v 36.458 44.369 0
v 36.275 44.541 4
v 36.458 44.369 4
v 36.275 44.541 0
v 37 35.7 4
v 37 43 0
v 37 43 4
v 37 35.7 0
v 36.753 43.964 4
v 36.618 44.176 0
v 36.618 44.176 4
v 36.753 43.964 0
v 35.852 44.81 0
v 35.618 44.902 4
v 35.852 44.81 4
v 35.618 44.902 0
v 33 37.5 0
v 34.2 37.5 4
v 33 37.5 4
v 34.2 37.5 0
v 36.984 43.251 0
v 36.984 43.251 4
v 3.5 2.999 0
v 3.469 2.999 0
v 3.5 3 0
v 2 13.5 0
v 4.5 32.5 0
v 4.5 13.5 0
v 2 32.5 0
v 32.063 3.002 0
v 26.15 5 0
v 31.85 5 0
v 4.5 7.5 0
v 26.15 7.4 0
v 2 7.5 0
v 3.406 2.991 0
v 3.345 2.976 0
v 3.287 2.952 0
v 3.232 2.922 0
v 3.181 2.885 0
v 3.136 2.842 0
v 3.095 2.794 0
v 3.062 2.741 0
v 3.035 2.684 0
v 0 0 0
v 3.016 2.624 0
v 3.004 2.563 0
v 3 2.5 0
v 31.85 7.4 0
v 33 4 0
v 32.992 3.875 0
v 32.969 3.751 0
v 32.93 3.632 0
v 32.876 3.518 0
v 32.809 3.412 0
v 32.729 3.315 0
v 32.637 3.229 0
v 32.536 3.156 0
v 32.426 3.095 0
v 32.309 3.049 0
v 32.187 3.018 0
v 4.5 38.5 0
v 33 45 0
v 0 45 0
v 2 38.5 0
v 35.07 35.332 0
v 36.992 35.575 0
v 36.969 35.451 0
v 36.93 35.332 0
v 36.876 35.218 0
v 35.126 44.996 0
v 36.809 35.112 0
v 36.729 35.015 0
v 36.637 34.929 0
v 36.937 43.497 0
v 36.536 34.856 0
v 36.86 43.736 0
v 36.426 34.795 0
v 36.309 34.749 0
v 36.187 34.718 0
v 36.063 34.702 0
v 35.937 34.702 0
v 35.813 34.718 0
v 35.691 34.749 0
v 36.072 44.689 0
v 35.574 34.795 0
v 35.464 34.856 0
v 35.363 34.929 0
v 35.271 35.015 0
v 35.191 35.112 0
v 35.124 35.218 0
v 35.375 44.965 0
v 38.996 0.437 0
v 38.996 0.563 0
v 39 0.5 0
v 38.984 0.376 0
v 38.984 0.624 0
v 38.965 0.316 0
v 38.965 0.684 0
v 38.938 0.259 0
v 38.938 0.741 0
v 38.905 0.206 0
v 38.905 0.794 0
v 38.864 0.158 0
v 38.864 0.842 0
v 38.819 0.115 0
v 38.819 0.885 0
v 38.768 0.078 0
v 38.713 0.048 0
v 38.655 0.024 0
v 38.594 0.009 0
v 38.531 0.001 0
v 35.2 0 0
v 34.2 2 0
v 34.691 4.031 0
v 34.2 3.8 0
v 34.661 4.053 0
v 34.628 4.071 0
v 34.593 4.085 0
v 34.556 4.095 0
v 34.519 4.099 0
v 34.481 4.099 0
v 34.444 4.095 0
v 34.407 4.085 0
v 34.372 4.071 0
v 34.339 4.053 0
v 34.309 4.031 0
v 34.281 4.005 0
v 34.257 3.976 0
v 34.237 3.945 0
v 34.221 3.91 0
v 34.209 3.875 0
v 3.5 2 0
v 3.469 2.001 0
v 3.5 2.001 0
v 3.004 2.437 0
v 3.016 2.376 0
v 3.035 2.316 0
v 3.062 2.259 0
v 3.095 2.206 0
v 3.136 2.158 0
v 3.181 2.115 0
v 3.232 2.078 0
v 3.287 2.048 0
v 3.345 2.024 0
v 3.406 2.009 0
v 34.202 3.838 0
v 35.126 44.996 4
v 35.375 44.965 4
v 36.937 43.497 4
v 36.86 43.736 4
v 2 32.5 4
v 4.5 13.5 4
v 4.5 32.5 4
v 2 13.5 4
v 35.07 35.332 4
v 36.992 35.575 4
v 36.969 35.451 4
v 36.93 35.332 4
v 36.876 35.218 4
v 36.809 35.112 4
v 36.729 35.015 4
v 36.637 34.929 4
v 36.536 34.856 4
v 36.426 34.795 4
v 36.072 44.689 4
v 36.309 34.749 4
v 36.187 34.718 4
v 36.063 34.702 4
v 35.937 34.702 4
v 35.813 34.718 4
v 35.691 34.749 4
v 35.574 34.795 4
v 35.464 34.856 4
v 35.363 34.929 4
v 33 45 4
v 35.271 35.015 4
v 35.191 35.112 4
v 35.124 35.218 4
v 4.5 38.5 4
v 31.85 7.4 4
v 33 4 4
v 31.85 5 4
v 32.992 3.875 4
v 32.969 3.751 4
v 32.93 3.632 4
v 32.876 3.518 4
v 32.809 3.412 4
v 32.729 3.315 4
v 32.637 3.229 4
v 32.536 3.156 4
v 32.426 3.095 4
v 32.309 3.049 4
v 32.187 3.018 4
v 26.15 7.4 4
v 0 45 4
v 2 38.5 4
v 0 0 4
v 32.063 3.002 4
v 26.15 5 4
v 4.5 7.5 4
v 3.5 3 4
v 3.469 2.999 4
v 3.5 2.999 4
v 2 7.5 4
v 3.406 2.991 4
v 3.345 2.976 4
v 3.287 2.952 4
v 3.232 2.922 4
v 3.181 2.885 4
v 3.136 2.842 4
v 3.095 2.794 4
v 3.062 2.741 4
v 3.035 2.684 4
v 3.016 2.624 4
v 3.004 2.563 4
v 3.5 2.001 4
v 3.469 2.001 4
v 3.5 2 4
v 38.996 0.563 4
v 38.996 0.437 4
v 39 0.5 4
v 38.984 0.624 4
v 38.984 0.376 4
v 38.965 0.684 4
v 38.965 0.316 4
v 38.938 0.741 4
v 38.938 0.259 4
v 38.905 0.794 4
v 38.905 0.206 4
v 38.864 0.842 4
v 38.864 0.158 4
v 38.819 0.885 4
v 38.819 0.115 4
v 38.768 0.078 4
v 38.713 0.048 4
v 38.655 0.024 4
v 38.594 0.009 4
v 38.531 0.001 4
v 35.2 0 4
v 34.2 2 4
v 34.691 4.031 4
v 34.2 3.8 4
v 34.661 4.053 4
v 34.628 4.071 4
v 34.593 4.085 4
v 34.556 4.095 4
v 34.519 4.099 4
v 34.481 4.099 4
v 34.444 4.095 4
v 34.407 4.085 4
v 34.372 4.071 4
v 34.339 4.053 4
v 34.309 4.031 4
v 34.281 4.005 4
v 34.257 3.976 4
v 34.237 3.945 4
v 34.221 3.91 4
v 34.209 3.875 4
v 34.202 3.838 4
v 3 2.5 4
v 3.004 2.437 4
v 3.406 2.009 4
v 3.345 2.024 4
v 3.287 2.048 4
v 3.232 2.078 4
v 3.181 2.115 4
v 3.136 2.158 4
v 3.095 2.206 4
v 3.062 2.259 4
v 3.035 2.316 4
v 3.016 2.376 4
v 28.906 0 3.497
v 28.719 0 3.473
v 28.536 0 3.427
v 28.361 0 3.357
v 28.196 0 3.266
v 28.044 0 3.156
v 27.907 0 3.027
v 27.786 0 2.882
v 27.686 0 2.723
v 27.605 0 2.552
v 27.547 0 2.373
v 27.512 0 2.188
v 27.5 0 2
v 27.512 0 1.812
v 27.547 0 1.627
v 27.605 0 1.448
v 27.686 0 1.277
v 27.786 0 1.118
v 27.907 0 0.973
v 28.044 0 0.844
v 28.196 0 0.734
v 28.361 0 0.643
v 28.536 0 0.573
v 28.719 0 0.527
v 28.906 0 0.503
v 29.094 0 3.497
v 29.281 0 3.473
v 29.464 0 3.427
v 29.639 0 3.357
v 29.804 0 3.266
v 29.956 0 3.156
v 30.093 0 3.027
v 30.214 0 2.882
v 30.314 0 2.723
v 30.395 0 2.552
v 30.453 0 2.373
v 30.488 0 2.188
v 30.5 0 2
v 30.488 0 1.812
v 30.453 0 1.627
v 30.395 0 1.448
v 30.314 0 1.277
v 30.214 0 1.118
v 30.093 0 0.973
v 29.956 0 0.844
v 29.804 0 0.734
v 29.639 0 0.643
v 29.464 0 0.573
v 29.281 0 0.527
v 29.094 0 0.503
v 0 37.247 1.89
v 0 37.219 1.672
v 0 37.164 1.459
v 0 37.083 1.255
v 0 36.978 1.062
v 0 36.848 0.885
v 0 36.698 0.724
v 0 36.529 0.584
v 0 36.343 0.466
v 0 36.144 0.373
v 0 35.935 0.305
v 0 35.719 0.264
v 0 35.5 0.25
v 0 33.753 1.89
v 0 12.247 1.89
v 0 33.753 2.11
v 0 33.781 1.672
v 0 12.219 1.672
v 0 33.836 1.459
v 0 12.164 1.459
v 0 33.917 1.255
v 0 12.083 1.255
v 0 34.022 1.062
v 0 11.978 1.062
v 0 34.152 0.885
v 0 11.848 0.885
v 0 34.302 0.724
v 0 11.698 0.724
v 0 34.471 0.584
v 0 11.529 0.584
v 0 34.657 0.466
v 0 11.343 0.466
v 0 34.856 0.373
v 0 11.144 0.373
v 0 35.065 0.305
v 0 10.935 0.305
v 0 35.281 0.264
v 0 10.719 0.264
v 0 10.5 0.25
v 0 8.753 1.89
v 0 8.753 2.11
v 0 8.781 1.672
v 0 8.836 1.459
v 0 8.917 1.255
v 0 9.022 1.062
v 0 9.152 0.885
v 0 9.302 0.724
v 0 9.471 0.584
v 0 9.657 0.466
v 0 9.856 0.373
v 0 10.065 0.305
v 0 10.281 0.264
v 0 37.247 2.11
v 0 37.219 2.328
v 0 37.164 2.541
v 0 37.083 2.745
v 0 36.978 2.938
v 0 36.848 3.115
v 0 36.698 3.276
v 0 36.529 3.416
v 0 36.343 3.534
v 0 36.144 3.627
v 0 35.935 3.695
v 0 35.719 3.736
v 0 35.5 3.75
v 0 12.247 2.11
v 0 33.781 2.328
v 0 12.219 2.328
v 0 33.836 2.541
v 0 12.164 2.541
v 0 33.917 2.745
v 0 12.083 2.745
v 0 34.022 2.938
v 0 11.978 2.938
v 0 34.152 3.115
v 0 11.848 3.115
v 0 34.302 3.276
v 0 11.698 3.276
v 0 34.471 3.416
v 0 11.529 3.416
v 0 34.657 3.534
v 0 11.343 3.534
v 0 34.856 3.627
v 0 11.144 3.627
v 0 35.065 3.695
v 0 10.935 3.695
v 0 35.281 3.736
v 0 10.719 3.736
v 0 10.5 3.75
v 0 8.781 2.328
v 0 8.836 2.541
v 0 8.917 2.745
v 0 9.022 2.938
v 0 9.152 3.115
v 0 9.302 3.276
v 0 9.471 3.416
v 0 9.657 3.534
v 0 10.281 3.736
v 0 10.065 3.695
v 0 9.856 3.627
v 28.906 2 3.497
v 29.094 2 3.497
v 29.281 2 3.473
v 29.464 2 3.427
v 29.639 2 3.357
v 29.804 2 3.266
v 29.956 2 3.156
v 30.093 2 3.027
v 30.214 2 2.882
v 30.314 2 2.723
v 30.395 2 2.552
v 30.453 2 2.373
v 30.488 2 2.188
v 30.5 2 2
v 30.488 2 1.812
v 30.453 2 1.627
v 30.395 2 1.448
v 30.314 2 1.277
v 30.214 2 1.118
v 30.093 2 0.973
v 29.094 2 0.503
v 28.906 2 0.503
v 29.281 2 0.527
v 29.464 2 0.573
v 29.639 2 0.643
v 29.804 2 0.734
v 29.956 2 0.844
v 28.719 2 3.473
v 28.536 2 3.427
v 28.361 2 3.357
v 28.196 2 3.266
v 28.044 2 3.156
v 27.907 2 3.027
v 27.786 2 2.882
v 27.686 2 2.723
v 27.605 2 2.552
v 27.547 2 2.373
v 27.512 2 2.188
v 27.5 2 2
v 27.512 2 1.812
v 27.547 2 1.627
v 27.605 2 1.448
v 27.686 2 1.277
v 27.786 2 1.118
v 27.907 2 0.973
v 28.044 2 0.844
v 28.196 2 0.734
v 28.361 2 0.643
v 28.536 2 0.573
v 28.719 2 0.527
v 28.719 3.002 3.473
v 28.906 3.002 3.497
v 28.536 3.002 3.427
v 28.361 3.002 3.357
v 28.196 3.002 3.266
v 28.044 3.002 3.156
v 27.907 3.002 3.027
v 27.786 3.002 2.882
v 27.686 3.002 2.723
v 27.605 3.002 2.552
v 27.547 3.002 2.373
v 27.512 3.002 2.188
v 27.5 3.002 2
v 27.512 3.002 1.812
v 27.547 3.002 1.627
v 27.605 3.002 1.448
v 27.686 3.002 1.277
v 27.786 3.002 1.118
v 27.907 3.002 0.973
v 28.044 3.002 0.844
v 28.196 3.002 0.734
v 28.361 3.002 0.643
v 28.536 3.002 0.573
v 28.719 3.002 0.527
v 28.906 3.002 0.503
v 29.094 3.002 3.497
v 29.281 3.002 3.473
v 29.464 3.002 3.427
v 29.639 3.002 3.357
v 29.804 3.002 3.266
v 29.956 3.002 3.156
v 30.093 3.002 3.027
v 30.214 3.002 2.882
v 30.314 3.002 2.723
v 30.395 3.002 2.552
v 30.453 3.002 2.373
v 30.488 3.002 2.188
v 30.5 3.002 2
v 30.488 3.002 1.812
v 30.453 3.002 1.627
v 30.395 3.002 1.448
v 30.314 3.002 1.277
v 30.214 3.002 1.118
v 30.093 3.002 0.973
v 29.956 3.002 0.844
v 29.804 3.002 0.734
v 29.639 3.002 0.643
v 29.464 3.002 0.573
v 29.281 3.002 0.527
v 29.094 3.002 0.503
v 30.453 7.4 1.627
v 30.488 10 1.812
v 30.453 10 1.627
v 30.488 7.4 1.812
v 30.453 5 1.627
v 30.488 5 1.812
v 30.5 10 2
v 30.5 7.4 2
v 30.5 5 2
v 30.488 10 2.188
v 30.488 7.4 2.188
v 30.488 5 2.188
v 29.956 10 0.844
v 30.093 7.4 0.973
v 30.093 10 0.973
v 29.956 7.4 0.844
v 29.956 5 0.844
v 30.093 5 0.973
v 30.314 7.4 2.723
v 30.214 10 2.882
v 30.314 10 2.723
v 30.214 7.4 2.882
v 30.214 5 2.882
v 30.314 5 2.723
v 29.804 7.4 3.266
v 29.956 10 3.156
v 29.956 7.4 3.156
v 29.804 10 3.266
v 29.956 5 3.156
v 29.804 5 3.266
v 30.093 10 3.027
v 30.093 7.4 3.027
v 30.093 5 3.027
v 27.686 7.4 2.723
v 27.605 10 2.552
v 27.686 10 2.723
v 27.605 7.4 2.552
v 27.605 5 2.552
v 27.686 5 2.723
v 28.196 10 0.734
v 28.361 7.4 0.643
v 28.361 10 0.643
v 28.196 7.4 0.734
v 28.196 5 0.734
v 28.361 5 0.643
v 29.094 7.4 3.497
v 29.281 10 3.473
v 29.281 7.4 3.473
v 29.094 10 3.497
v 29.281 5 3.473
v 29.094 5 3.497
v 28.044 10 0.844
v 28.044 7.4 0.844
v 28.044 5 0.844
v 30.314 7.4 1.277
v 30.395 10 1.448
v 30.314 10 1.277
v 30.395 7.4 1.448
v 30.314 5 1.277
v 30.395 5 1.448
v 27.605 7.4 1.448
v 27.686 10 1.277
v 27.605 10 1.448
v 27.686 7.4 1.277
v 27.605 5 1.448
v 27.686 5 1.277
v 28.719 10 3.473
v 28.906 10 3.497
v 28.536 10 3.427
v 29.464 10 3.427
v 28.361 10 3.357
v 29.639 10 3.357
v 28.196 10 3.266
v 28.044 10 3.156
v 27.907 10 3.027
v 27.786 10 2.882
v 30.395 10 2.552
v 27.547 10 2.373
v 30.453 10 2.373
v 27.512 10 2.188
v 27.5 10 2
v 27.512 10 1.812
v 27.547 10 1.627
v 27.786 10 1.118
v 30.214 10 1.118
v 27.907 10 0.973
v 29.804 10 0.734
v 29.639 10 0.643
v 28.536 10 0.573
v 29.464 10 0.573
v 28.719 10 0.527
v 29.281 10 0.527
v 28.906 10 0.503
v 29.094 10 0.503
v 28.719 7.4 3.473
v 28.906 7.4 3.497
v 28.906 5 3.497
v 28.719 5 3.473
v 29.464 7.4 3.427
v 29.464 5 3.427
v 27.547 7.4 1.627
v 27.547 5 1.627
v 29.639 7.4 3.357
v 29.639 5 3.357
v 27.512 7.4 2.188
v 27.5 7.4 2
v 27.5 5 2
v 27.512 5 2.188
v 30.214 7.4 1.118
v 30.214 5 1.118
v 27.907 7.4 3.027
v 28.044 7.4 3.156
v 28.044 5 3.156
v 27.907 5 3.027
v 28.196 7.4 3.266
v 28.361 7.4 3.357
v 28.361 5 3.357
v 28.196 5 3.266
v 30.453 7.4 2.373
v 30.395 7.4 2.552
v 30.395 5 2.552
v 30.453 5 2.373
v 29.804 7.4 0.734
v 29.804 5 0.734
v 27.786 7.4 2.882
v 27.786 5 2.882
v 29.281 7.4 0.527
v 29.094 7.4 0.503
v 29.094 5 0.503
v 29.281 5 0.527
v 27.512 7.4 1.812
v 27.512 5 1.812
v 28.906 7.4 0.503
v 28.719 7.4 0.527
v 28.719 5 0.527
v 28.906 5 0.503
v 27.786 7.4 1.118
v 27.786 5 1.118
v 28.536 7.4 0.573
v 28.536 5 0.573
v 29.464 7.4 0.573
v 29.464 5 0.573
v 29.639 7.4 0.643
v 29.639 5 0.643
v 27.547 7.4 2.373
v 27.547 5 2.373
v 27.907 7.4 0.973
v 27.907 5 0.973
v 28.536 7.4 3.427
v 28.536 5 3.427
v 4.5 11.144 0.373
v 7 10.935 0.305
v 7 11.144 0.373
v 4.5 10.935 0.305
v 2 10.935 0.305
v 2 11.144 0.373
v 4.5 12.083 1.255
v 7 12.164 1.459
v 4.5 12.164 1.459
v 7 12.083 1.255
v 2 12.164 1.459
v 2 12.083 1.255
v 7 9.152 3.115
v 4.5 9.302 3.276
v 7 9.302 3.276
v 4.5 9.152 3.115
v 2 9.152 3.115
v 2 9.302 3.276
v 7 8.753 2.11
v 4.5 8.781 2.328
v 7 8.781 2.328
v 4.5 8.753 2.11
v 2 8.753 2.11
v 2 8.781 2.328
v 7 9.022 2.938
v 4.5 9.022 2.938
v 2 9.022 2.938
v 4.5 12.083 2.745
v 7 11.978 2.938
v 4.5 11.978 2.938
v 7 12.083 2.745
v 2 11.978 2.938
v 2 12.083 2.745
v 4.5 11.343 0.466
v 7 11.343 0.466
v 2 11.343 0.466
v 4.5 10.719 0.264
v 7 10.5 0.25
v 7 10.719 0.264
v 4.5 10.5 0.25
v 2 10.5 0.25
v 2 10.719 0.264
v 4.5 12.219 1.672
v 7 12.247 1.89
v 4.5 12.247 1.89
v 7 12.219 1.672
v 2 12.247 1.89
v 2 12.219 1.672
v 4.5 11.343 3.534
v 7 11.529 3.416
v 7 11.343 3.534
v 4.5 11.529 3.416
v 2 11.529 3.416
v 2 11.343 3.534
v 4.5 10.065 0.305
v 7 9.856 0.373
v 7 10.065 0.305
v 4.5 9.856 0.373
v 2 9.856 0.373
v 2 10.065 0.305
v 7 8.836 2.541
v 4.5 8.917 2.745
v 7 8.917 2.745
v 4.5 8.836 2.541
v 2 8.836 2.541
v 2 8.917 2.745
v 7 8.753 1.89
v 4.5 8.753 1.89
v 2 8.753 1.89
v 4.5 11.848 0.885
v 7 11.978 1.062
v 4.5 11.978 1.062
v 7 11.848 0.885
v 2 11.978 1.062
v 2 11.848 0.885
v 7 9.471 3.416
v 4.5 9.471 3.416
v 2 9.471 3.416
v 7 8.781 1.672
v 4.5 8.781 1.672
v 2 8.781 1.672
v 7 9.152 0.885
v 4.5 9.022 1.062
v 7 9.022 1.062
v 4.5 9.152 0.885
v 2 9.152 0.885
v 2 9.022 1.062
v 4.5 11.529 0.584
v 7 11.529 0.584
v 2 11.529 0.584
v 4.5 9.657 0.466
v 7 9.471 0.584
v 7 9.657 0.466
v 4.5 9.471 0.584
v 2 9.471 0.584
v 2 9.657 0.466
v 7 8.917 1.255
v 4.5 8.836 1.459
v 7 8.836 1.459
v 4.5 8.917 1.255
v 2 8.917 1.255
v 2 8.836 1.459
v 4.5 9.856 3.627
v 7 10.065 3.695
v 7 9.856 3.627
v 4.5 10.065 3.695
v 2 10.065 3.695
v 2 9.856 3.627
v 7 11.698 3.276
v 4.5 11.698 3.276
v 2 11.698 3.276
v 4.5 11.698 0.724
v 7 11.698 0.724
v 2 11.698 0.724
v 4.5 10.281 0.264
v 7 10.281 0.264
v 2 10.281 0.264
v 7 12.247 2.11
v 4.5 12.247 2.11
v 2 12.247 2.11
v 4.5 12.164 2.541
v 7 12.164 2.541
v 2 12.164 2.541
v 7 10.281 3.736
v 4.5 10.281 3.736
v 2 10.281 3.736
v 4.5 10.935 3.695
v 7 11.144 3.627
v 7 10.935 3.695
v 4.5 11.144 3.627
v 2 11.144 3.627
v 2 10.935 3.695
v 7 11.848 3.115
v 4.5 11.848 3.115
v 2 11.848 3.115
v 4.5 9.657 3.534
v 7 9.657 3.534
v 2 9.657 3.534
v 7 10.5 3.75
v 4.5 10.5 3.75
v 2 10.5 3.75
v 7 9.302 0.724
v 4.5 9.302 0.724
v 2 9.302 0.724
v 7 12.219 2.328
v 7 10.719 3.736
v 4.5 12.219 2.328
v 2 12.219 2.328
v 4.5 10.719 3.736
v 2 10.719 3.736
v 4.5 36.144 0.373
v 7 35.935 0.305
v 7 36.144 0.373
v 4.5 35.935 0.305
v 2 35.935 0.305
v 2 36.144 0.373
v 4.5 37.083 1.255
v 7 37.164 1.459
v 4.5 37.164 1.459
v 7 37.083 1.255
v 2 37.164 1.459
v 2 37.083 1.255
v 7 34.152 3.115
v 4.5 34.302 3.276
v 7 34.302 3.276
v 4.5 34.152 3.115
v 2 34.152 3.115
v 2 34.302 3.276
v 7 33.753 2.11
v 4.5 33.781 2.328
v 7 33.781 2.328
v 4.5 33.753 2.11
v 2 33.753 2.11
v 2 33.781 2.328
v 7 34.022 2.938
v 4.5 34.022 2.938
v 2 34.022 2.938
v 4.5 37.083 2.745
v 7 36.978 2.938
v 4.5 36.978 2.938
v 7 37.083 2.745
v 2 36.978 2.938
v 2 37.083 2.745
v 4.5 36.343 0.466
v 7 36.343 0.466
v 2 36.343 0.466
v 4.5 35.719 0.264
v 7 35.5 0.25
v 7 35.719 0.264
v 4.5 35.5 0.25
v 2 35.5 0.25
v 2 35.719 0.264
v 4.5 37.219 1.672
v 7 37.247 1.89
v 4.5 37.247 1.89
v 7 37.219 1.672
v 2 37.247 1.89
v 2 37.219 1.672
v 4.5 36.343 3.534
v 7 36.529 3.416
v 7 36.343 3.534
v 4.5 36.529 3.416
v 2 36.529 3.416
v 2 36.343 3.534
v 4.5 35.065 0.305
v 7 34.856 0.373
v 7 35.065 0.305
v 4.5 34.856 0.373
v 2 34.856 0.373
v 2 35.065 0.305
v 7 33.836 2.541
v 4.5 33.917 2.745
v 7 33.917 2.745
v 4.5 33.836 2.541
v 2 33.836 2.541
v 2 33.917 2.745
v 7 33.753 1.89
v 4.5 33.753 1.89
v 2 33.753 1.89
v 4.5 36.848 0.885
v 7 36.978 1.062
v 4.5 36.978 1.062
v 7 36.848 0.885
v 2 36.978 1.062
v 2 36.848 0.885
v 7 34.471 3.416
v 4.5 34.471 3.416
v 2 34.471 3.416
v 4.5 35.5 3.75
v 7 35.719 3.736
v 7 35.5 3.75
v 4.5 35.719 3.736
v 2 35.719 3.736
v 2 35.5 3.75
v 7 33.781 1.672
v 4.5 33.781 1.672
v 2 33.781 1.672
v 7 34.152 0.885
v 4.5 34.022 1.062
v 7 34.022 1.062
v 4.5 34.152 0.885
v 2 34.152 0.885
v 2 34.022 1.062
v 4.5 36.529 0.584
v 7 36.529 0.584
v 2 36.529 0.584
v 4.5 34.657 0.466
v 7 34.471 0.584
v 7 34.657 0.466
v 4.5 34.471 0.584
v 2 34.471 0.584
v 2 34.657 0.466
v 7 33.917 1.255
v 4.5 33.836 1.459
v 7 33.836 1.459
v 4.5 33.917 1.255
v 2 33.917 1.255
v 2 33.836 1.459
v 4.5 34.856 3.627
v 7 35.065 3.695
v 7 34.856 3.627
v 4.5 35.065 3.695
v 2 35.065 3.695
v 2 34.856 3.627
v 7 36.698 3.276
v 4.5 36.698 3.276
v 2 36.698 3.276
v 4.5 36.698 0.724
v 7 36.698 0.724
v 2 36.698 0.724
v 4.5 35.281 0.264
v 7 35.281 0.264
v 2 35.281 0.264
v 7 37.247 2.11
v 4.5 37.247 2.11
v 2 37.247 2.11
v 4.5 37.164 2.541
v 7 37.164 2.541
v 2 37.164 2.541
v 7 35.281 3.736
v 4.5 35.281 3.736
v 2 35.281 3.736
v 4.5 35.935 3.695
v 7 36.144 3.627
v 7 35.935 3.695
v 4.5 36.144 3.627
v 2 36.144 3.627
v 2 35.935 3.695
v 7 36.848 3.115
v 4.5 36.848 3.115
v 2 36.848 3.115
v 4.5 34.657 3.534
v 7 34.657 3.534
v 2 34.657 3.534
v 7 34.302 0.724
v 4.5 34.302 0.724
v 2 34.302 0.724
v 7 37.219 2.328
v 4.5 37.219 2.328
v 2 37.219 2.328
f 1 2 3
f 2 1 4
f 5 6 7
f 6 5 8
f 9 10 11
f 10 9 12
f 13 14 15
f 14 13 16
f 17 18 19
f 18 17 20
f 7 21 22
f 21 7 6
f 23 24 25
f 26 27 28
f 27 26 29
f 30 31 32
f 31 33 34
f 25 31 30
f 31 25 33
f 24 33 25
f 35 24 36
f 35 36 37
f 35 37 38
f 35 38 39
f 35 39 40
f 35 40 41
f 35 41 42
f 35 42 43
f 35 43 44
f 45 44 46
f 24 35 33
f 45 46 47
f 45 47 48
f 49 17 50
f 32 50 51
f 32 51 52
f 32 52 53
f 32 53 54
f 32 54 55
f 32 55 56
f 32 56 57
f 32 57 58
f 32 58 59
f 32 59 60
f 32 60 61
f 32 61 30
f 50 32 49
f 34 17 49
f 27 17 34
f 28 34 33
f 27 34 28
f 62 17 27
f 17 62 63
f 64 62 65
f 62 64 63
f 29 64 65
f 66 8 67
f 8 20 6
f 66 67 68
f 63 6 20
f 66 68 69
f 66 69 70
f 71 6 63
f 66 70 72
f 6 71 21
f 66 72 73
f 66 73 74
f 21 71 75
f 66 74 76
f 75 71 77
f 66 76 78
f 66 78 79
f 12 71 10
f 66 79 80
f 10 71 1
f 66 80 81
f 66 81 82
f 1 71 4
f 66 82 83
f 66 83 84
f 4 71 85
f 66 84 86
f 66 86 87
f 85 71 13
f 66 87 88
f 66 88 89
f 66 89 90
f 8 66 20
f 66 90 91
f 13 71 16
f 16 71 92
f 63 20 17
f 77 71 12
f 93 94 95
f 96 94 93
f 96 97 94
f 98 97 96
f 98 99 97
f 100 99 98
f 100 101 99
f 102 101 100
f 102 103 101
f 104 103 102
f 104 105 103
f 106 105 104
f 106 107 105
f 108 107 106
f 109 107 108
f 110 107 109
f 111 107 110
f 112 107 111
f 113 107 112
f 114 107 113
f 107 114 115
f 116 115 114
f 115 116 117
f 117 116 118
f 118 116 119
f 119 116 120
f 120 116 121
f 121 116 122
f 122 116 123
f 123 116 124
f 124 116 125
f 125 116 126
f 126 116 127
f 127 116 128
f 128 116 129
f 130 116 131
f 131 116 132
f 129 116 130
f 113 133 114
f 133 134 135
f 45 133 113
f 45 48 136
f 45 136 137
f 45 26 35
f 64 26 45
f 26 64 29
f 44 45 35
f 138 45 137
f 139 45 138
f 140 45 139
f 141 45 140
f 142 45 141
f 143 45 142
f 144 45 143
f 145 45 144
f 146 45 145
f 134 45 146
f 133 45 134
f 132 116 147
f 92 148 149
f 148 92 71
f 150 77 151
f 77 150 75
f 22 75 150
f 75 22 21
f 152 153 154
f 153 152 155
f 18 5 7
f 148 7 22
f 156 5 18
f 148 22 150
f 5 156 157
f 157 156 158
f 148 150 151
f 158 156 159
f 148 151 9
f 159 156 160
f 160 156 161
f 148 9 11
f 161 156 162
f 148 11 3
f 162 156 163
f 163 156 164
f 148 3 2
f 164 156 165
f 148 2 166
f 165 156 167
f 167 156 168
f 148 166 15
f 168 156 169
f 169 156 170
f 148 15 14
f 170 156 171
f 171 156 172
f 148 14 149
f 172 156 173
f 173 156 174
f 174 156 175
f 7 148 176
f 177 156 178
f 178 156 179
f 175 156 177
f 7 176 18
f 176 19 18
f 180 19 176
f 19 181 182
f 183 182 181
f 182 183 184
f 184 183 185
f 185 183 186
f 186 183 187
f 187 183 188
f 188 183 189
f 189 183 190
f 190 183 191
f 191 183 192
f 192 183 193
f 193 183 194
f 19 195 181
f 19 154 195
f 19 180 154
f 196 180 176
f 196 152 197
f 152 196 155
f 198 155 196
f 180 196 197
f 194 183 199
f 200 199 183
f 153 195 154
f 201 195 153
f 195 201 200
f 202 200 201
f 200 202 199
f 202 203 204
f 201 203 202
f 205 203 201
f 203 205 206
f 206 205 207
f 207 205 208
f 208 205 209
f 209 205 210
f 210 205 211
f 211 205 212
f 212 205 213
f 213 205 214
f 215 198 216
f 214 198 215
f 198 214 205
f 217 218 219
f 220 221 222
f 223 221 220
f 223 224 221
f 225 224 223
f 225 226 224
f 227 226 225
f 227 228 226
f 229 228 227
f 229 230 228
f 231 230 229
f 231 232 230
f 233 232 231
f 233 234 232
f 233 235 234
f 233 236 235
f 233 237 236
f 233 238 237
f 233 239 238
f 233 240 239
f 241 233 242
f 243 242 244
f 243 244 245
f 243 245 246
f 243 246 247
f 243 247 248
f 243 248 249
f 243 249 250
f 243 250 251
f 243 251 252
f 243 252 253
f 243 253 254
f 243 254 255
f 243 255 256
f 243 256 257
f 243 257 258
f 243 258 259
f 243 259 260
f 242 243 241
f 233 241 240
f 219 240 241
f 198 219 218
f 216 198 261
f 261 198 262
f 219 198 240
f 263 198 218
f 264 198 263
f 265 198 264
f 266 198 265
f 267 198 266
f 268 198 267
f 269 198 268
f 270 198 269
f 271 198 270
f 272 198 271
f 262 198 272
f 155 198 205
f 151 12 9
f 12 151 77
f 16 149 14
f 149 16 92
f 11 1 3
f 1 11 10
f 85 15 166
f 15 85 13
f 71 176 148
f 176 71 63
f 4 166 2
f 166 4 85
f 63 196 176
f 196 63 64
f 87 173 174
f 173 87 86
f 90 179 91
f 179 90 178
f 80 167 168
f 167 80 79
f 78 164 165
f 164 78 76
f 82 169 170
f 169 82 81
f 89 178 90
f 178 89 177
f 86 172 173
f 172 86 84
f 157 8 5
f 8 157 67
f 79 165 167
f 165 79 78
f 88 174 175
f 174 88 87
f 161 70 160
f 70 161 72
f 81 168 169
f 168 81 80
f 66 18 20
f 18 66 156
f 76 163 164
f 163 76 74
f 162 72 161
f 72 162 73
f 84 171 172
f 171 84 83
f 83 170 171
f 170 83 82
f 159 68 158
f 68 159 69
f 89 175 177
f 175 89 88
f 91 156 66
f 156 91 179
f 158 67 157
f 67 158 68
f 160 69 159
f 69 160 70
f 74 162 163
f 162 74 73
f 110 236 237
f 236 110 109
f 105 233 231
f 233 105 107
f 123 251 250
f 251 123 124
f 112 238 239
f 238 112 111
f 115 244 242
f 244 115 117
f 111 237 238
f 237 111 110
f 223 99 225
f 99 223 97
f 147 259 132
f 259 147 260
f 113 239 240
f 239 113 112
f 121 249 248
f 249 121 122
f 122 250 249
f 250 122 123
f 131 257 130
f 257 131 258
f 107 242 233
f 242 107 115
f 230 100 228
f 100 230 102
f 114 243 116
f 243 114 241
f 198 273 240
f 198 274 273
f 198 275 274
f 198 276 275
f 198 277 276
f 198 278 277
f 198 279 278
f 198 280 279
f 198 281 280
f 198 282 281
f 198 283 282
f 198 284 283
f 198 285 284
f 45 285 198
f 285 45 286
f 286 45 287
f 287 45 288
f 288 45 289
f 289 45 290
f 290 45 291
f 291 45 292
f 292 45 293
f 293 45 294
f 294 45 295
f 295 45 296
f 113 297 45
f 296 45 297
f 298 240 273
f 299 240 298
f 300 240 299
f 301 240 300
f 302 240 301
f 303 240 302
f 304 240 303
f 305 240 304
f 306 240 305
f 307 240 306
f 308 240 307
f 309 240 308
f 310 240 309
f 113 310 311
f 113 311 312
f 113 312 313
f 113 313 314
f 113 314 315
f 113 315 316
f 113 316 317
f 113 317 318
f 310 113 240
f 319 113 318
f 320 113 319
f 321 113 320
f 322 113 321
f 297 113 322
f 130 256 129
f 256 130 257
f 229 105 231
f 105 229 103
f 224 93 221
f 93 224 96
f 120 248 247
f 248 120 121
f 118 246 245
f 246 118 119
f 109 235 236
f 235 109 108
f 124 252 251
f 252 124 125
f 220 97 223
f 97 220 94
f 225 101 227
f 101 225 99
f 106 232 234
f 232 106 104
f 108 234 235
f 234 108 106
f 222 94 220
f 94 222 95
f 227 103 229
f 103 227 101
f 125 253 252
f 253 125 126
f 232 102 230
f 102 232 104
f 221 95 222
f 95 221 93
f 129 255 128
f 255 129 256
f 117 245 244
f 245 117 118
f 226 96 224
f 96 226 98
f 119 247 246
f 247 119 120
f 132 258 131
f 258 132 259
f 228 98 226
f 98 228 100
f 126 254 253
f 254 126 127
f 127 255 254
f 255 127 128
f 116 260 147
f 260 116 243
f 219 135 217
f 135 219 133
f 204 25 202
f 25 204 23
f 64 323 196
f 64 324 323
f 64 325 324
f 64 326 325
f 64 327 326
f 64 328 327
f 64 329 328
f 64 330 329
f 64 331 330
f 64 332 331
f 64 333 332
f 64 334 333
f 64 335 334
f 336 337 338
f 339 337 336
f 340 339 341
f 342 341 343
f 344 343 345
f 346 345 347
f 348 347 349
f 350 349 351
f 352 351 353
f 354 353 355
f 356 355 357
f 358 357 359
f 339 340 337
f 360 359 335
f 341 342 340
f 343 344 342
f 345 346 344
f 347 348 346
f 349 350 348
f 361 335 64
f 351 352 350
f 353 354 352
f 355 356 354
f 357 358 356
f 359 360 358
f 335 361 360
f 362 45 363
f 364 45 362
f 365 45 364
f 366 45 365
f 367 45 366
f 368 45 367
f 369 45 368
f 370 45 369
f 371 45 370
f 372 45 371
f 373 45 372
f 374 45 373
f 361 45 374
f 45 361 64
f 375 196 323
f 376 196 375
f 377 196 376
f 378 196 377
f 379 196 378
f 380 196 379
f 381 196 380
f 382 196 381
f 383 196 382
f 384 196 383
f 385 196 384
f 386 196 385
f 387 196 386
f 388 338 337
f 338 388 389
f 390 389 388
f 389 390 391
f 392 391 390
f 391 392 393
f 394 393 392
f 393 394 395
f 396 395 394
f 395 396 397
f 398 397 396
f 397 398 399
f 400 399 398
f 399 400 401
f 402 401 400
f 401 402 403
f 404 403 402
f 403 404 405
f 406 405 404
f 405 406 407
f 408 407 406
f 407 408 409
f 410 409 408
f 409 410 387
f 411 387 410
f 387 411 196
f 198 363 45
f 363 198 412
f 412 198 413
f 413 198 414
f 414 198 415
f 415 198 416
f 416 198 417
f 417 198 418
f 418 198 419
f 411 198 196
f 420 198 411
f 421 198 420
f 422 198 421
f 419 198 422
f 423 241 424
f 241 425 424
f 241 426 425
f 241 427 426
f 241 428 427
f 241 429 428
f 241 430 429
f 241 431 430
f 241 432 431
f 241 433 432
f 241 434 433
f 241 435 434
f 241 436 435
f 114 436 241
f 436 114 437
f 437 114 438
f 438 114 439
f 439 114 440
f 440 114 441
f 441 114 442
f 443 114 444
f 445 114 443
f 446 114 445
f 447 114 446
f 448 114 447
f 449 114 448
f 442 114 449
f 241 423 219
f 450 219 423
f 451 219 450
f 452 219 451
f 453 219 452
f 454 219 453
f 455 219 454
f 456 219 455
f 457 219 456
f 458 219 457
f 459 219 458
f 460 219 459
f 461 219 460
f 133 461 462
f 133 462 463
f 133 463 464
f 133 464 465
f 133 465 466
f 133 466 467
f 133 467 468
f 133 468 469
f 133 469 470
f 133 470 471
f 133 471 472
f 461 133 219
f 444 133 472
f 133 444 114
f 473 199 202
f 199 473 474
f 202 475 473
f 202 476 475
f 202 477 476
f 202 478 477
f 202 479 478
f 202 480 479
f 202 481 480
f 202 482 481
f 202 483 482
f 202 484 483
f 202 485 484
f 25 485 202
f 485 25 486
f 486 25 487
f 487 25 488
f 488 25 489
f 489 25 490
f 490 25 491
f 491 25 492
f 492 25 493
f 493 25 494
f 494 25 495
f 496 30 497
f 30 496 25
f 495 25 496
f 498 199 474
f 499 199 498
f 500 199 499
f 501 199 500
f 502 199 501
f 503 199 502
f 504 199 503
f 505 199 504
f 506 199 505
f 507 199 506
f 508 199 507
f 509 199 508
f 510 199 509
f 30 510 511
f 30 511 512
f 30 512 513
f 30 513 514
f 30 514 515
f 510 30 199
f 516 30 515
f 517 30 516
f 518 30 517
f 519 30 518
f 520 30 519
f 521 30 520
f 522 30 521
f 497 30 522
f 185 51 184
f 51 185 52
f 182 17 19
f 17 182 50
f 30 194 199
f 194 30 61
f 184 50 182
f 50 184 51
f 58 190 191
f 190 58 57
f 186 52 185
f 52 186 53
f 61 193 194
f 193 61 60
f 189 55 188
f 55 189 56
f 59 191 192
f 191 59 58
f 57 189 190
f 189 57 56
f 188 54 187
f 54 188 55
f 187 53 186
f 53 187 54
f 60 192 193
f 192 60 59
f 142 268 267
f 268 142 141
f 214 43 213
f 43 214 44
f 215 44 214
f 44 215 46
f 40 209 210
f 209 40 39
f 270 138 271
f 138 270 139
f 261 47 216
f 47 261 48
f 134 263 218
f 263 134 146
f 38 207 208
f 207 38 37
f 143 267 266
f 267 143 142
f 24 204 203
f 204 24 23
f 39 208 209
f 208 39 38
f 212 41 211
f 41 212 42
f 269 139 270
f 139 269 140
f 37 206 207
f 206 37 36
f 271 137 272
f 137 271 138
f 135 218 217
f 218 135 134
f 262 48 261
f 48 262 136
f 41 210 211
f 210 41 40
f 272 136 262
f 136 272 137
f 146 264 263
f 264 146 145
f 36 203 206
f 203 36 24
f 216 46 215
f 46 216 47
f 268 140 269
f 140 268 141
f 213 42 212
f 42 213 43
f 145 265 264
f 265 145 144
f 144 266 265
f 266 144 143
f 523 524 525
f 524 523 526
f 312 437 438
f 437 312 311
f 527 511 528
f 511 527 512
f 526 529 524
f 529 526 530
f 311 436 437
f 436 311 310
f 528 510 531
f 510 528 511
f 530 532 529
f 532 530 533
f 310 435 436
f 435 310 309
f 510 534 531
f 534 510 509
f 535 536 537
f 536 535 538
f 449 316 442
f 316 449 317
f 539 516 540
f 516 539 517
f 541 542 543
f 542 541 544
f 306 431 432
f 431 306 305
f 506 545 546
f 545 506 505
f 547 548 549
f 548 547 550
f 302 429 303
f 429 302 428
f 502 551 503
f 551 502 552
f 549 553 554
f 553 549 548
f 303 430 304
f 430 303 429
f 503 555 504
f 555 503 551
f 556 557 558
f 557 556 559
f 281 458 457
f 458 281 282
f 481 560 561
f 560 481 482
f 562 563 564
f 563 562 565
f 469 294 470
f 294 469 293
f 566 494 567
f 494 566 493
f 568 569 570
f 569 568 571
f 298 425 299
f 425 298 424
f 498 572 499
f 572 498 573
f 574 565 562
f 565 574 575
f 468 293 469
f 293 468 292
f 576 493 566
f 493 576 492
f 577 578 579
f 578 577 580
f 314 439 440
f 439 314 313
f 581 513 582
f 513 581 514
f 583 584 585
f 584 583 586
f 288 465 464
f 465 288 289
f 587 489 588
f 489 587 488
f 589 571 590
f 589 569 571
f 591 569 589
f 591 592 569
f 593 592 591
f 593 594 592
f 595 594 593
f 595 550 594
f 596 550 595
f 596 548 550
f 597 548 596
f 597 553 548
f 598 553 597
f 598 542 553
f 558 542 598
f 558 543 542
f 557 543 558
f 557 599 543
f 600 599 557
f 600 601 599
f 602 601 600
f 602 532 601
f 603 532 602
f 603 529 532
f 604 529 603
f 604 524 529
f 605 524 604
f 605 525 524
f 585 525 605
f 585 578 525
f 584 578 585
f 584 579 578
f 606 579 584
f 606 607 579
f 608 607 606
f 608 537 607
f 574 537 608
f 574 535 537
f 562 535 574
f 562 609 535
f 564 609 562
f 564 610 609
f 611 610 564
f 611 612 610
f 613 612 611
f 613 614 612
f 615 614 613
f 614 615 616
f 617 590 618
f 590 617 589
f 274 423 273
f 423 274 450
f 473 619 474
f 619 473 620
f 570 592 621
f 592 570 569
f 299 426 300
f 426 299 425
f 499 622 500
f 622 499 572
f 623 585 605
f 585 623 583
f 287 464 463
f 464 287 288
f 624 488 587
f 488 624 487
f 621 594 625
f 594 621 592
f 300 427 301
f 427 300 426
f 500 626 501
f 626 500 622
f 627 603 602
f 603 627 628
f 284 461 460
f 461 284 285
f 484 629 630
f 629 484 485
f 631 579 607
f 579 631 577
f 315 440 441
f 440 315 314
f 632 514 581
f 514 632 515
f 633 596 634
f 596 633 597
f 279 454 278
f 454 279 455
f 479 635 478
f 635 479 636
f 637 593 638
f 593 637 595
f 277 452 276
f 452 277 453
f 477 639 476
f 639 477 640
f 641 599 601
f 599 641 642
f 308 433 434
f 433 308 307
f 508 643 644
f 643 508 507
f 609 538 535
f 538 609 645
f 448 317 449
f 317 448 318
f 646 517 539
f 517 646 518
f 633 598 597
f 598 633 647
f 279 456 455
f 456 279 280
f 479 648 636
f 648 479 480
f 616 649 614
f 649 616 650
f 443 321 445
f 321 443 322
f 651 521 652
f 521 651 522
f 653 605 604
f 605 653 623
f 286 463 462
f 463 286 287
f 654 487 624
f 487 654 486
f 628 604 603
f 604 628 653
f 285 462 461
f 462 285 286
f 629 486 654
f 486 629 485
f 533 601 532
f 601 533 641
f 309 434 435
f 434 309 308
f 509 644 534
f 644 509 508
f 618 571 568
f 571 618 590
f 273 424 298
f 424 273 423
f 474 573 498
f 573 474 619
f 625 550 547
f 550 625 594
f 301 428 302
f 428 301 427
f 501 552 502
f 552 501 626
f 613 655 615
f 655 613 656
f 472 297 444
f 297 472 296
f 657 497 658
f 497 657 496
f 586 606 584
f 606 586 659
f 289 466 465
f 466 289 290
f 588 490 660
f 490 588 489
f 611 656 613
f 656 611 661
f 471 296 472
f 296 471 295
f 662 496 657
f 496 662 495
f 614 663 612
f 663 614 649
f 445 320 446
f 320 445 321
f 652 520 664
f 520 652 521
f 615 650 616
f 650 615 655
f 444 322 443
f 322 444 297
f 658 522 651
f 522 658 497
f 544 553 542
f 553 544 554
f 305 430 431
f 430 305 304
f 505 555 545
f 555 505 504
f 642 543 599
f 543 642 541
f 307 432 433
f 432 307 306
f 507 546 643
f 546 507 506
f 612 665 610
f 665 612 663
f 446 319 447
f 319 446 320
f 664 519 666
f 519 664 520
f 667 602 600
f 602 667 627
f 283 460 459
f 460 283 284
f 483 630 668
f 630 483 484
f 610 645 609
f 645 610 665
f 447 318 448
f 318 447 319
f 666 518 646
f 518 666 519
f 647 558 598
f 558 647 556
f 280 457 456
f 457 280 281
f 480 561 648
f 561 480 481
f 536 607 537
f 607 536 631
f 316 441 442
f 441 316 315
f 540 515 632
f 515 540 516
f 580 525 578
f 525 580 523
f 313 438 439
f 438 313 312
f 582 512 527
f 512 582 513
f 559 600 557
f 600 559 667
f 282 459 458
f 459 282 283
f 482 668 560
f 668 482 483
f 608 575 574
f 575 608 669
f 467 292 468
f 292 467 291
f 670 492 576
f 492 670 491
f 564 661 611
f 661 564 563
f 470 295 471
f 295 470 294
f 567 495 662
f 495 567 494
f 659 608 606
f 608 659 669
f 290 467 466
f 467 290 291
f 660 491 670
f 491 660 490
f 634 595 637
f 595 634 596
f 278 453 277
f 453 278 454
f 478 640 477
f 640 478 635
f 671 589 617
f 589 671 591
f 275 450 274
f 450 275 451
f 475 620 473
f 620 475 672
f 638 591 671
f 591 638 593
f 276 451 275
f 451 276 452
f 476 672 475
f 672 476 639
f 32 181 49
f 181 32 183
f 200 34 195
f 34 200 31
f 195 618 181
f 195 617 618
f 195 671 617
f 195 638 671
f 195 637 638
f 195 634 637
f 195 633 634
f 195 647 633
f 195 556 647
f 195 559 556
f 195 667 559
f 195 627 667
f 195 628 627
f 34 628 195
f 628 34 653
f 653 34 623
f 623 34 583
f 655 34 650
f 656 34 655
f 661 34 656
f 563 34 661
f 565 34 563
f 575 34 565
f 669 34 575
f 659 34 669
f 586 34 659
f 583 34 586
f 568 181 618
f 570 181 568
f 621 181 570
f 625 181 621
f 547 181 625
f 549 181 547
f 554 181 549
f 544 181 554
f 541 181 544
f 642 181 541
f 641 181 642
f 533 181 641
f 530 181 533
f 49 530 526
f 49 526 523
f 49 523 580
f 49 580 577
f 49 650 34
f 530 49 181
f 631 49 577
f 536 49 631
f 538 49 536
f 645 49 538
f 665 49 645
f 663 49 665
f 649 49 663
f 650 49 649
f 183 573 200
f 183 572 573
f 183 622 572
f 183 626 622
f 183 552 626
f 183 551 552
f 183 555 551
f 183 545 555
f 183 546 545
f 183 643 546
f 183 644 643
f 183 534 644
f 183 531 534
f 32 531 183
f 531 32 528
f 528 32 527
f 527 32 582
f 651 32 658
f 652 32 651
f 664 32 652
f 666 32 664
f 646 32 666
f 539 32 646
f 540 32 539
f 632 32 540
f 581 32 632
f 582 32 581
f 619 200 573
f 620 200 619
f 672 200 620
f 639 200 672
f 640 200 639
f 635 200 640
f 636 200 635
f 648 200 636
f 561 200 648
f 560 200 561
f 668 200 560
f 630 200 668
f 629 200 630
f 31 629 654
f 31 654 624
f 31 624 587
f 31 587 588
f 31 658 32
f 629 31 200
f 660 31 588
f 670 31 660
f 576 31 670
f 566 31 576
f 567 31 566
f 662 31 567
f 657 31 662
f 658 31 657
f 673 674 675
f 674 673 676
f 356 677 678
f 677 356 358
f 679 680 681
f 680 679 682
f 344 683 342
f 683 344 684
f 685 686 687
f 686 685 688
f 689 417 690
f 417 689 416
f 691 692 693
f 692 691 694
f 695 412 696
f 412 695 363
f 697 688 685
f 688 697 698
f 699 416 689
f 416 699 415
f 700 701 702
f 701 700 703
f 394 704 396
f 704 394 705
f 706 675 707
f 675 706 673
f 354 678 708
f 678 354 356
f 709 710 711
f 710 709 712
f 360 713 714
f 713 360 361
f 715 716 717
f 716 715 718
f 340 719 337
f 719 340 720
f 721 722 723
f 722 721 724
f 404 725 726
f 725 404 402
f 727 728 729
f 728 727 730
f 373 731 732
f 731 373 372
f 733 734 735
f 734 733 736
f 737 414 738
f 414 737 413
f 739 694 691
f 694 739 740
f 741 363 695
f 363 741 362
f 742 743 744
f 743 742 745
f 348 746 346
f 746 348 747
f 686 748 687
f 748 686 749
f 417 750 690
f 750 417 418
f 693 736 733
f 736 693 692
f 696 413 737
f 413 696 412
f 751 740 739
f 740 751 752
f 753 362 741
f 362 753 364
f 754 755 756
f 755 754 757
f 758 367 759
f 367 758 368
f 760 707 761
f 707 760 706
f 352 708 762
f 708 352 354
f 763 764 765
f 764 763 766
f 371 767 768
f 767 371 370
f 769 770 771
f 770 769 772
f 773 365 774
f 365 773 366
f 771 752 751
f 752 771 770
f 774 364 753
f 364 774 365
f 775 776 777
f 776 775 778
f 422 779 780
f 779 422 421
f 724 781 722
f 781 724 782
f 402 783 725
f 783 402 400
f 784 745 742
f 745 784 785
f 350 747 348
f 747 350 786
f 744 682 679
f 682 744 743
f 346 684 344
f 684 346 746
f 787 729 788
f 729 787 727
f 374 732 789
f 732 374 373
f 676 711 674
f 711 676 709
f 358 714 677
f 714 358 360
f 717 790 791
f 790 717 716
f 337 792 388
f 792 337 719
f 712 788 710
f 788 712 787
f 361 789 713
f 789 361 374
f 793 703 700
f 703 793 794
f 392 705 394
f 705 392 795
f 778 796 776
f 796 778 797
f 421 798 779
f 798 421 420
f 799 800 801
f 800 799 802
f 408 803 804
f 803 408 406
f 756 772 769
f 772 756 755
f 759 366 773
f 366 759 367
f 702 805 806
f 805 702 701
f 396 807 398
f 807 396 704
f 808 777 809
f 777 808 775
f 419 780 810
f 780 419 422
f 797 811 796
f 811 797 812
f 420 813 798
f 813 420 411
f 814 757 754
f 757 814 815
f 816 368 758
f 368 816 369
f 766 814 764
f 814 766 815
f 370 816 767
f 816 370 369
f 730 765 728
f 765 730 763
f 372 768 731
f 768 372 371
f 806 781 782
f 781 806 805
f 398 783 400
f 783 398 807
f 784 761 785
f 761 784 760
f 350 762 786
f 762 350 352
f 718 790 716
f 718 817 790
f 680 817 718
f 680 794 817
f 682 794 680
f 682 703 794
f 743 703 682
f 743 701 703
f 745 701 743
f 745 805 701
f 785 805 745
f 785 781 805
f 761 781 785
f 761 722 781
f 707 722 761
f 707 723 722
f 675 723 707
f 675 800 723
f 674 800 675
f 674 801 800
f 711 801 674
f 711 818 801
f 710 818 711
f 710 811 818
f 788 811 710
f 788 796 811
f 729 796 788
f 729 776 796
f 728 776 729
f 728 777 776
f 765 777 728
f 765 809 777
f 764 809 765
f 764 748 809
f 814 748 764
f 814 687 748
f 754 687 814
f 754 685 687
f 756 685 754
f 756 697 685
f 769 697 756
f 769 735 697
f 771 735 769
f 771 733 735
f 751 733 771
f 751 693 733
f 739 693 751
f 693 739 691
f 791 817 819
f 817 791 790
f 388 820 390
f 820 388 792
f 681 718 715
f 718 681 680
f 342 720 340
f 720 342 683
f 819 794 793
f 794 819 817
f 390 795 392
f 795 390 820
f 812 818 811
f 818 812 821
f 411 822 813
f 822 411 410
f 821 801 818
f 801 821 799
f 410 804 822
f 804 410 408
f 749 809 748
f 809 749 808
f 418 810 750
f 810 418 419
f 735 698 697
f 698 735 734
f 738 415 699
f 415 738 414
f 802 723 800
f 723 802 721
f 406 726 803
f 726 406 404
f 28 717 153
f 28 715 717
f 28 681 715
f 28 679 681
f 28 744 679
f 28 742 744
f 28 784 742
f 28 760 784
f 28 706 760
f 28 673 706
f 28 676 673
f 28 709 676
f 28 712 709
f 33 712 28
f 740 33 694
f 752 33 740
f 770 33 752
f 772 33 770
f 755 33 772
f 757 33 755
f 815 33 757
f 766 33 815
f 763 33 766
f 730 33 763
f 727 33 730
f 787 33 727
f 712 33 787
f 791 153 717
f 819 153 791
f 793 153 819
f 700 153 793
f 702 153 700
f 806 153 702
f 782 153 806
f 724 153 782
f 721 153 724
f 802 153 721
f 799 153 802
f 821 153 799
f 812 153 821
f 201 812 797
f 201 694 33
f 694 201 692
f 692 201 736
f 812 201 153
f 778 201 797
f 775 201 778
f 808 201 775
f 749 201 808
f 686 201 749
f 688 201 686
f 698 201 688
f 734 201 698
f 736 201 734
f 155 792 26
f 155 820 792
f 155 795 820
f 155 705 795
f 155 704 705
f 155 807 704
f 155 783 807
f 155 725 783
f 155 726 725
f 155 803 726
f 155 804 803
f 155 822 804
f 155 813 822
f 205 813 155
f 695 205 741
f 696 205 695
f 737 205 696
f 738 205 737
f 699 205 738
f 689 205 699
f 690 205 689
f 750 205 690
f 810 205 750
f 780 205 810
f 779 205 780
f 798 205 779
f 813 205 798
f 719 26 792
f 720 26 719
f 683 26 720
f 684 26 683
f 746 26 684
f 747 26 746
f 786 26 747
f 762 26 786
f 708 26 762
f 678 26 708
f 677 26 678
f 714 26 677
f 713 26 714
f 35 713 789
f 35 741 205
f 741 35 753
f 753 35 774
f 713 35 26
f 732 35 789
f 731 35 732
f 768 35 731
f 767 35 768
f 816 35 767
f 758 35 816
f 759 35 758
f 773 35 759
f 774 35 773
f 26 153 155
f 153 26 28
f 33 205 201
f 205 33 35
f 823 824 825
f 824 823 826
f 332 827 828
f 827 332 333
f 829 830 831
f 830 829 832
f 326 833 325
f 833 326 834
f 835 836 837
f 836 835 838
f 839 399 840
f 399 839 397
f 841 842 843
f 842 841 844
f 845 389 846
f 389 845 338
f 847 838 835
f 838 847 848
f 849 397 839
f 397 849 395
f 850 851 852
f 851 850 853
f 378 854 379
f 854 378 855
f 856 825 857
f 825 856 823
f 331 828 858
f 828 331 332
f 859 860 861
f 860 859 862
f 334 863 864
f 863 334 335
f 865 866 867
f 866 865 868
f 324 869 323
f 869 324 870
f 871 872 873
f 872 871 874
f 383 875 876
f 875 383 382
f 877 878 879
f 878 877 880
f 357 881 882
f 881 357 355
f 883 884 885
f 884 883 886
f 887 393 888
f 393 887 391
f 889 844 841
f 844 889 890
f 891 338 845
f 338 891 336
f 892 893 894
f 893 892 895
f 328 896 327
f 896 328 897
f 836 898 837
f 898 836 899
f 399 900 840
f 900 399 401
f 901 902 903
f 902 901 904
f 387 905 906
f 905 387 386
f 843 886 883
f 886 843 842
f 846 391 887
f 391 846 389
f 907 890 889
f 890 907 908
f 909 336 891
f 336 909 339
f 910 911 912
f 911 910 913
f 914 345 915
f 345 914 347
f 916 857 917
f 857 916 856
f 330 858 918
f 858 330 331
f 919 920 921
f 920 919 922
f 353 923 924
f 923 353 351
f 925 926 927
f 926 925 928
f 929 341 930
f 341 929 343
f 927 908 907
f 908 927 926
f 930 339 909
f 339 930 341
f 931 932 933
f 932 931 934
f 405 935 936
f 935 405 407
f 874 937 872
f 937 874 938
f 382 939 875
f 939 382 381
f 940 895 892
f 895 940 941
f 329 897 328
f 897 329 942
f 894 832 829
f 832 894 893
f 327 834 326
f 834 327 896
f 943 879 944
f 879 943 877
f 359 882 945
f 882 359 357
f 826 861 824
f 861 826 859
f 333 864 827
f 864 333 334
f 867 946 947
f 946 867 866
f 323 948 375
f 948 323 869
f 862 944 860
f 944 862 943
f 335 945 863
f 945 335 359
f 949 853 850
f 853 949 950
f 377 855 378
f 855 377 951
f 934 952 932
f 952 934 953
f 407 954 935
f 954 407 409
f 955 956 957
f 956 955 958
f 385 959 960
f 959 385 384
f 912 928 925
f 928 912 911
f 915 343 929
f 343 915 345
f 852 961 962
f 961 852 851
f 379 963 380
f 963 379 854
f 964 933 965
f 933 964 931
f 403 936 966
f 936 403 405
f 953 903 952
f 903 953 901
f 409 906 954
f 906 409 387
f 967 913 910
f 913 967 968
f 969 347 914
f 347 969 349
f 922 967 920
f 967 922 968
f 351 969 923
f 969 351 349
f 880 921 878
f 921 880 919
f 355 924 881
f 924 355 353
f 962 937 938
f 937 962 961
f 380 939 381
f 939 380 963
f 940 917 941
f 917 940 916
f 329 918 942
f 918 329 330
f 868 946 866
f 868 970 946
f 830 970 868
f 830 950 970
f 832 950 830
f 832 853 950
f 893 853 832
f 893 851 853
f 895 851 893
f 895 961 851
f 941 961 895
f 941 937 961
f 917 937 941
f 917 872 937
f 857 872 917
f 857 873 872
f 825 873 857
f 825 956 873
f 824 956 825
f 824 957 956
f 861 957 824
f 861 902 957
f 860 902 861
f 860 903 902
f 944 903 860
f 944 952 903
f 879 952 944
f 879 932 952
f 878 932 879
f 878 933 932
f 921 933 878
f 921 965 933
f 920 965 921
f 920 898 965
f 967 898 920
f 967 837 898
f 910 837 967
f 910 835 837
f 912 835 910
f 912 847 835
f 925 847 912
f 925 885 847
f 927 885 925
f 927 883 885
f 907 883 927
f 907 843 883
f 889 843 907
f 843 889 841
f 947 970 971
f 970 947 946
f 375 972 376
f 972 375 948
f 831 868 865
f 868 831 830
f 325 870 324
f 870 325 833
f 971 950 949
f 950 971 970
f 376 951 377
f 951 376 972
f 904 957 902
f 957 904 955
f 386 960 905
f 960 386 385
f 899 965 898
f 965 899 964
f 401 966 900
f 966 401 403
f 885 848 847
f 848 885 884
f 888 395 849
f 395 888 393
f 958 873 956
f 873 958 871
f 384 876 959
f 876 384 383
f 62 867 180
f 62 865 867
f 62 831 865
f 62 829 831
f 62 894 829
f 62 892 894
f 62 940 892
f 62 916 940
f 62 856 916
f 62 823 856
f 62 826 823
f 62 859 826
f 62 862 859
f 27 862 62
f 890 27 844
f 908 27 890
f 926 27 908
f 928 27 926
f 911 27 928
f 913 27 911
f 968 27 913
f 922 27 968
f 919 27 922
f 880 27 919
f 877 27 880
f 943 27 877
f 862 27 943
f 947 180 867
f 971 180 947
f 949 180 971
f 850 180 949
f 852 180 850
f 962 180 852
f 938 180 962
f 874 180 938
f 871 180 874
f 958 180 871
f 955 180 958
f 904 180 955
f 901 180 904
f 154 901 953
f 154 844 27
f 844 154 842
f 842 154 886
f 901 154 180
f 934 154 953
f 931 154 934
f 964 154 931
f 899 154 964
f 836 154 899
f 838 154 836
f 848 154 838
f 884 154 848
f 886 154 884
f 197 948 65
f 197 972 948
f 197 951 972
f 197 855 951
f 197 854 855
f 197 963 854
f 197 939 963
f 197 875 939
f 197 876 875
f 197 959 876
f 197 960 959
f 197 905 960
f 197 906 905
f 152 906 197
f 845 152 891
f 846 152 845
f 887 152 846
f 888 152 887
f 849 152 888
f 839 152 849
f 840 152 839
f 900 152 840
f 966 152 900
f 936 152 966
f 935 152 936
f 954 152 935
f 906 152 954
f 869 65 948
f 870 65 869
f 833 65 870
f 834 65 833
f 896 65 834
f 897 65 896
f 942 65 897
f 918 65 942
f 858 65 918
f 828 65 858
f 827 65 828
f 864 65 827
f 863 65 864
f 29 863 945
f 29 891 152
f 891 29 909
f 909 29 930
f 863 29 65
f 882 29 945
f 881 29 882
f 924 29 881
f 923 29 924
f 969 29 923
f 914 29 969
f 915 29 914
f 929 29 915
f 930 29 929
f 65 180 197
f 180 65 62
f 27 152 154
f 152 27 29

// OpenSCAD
//-------------------------------------------------------------------
// title: DIN clip
// author: OK1HRA 
// license: Creative Commons BY-SA
// URL: http://remoteqth.com/3d-din-rail-mount-clip.php
// Original revision: 0.1
// revision: 0.2b Contributed by John Cabrer
// format: OpenSCAD
//-------------------------------------------------------------------
// HowTo:
// Determine the center to center hole spacing of the device to mount (mount_hole_spacing)
// Pick a metric screw size, and length
// Pick a nut width and height
// See http://mcmaster-carr.com/ for drawings of all screws and nuts.
// The mount post length is calculated based on the screw length
// After after making your changes, press F5 to re-render them to the screen
// .STL export press F6 and menu /Design/Export as STL...

// ----- Inside Hole Calibration Values --------
// To use, print out a part with default values (i.e. mount_nut_width = 8,
// actual_measurement = 8)
// Measure the resulting hole width of the nut, and type that value as the actual measurement. Render and export. Print again.
// The gain_adjust value will insure that holes measure as they should.

expected_measurement = 8;
actual_measurement = 8;
gain_adjust = expected_measurement / actual_measurement; // Default = 8/8 = 1

//----------------- Mounting Screw Input Parameters ---------------------------------
plate_thickness = 1.65;    // This is the thickness of the thing being mounted
mount_hole_spacing = 25;    // mount_hole_spacing between mounting holes. 31mm for LCD1602. 50?mm for relay module
mount_screw_length = 6; // Min = 6
mount_screw_thread_diameter = 3.5;    // Min = 1, Max = 6
mount_nut_width = 6;   // Max = 10
mount_nut_height = 2.5;   // Max = 5

//----------------- Mounting Srew Input Parameters, Default is M3x8 ---------------------------------
lock_screw_length = 8; 
lock_screw_thread_diameter = 3 * gain_adjust;
lock_nut_width = 5.5 * gain_adjust;
lock_nut_height = 2.4 * gain_adjust;

//----------------- Calculated Parameters
standoff_length = mount_screw_length - (mount_nut_height * gain_adjust) - plate_thickness - 2;
$fn=50;
width = 4; 
r_mount_screw = (mount_screw_thread_diameter * gain_adjust) / 2;      // Radius of the mounting screw threads
r_lock_screw = (lock_screw_thread_diameter * gain_adjust) / 2;
expand = 20;      // 0-x
long = 45;

din();

module din(){
	difference() {
		union() {
			hull() {
				translate([15+expand,long-2,0]) {
                    cylinder(h=width, r=2, center=false);}

                translate([12+expand,37.5,0]) {
                    cube([5,1,width], center=false);}

                translate([12+expand,long-1,0]) {
                    cube([1,1,width], center=false);}
            }

			hull() {
				translate([16+expand,35.7,0]) {
                    cylinder(h=width, r=1, center=false);}

                translate([14.2+expand,37.5,0]) {
                    cube([2.8,1,width], center=false);}
            }

			hull() {
				translate([18.5+expand,0.5,0]) {
                    cylinder(h=width, r=0.5, center=false);}
				translate([14.5+expand,3.8,0]) {
                    cylinder(h=width, r=0.3, center=false);}
				translate([14.2+expand,0,0]) {
                    cube([1,1,width], center=false);}
			}

			cube([3.5,4,width], center=false);
            cube([15+expand,2,width], center=false);

			hull() {
				translate([12+expand,4,0]) {
                    cylinder(h=width, r=1, center=false);}

                translate([0,3,0]) {
                    cube([1,1,width], center=false);}

                translate([0,long-1,0]) {
                    cube([13+expand,1,width], center=false);}
            }

			hull() {
            translate([0,40,0]) {
                cube([14,1,width], center=false);}

            translate([2,mount_hole_spacing+14,0]) {
                cylinder(h=width, r=2, center=false);}

            translate([6,mount_hole_spacing+14,0]) {
                cylinder(h=width, r=2, center=false);}
            }

            translate([-standoff_length,10.5-3.5,0]) {
                cube([standoff_length+1,7,width], center=false);}

            translate([-standoff_length,10.5-3.5+mount_hole_spacing,0]) {
                cube([standoff_length+1,7,width], center=false);}
        }
        // Clip fillet
        translate([3.5,2.5,-1]) {
            cylinder(h=width+2, r=0.5, center=false);}
        
        // Lock Screw and Nut
        translate([9+expand,-1,width/2]) rotate([-90,0,0]){
            cylinder(h=lock_screw_length+3, r=r_lock_screw, center=false);}

		translate([6.15+expand,5,-1]) {
            cube([5.7,lock_nut_height,width+2], center=false);}

        // 1. mount
        translate([-1-standoff_length,10.5,width/2]) rotate([0,90,0]){
            cylinder(h=standoff_length+8, r=r_mount_screw, center=false);}

		translate([2,7.65 - (((mount_nut_width * gain_adjust) - 5.7) / 2),-1]) {
            cube([mount_nut_height * gain_adjust,mount_nut_width * gain_adjust,width+2], center=false);}

        // 2. mount
        translate([-1-standoff_length,10.5+mount_hole_spacing,width/2]) rotate([0,90,0]){
            cylinder(h=standoff_length+8, r=r_mount_screw, center=false);}

		translate([2,7.65 - (((mount_nut_width * gain_adjust) - 5.7) / 2)+mount_hole_spacing,-1]) {
            cube([mount_nut_height * gain_adjust,mount_nut_width * gain_adjust,width+2], center=false);}
    }
}
